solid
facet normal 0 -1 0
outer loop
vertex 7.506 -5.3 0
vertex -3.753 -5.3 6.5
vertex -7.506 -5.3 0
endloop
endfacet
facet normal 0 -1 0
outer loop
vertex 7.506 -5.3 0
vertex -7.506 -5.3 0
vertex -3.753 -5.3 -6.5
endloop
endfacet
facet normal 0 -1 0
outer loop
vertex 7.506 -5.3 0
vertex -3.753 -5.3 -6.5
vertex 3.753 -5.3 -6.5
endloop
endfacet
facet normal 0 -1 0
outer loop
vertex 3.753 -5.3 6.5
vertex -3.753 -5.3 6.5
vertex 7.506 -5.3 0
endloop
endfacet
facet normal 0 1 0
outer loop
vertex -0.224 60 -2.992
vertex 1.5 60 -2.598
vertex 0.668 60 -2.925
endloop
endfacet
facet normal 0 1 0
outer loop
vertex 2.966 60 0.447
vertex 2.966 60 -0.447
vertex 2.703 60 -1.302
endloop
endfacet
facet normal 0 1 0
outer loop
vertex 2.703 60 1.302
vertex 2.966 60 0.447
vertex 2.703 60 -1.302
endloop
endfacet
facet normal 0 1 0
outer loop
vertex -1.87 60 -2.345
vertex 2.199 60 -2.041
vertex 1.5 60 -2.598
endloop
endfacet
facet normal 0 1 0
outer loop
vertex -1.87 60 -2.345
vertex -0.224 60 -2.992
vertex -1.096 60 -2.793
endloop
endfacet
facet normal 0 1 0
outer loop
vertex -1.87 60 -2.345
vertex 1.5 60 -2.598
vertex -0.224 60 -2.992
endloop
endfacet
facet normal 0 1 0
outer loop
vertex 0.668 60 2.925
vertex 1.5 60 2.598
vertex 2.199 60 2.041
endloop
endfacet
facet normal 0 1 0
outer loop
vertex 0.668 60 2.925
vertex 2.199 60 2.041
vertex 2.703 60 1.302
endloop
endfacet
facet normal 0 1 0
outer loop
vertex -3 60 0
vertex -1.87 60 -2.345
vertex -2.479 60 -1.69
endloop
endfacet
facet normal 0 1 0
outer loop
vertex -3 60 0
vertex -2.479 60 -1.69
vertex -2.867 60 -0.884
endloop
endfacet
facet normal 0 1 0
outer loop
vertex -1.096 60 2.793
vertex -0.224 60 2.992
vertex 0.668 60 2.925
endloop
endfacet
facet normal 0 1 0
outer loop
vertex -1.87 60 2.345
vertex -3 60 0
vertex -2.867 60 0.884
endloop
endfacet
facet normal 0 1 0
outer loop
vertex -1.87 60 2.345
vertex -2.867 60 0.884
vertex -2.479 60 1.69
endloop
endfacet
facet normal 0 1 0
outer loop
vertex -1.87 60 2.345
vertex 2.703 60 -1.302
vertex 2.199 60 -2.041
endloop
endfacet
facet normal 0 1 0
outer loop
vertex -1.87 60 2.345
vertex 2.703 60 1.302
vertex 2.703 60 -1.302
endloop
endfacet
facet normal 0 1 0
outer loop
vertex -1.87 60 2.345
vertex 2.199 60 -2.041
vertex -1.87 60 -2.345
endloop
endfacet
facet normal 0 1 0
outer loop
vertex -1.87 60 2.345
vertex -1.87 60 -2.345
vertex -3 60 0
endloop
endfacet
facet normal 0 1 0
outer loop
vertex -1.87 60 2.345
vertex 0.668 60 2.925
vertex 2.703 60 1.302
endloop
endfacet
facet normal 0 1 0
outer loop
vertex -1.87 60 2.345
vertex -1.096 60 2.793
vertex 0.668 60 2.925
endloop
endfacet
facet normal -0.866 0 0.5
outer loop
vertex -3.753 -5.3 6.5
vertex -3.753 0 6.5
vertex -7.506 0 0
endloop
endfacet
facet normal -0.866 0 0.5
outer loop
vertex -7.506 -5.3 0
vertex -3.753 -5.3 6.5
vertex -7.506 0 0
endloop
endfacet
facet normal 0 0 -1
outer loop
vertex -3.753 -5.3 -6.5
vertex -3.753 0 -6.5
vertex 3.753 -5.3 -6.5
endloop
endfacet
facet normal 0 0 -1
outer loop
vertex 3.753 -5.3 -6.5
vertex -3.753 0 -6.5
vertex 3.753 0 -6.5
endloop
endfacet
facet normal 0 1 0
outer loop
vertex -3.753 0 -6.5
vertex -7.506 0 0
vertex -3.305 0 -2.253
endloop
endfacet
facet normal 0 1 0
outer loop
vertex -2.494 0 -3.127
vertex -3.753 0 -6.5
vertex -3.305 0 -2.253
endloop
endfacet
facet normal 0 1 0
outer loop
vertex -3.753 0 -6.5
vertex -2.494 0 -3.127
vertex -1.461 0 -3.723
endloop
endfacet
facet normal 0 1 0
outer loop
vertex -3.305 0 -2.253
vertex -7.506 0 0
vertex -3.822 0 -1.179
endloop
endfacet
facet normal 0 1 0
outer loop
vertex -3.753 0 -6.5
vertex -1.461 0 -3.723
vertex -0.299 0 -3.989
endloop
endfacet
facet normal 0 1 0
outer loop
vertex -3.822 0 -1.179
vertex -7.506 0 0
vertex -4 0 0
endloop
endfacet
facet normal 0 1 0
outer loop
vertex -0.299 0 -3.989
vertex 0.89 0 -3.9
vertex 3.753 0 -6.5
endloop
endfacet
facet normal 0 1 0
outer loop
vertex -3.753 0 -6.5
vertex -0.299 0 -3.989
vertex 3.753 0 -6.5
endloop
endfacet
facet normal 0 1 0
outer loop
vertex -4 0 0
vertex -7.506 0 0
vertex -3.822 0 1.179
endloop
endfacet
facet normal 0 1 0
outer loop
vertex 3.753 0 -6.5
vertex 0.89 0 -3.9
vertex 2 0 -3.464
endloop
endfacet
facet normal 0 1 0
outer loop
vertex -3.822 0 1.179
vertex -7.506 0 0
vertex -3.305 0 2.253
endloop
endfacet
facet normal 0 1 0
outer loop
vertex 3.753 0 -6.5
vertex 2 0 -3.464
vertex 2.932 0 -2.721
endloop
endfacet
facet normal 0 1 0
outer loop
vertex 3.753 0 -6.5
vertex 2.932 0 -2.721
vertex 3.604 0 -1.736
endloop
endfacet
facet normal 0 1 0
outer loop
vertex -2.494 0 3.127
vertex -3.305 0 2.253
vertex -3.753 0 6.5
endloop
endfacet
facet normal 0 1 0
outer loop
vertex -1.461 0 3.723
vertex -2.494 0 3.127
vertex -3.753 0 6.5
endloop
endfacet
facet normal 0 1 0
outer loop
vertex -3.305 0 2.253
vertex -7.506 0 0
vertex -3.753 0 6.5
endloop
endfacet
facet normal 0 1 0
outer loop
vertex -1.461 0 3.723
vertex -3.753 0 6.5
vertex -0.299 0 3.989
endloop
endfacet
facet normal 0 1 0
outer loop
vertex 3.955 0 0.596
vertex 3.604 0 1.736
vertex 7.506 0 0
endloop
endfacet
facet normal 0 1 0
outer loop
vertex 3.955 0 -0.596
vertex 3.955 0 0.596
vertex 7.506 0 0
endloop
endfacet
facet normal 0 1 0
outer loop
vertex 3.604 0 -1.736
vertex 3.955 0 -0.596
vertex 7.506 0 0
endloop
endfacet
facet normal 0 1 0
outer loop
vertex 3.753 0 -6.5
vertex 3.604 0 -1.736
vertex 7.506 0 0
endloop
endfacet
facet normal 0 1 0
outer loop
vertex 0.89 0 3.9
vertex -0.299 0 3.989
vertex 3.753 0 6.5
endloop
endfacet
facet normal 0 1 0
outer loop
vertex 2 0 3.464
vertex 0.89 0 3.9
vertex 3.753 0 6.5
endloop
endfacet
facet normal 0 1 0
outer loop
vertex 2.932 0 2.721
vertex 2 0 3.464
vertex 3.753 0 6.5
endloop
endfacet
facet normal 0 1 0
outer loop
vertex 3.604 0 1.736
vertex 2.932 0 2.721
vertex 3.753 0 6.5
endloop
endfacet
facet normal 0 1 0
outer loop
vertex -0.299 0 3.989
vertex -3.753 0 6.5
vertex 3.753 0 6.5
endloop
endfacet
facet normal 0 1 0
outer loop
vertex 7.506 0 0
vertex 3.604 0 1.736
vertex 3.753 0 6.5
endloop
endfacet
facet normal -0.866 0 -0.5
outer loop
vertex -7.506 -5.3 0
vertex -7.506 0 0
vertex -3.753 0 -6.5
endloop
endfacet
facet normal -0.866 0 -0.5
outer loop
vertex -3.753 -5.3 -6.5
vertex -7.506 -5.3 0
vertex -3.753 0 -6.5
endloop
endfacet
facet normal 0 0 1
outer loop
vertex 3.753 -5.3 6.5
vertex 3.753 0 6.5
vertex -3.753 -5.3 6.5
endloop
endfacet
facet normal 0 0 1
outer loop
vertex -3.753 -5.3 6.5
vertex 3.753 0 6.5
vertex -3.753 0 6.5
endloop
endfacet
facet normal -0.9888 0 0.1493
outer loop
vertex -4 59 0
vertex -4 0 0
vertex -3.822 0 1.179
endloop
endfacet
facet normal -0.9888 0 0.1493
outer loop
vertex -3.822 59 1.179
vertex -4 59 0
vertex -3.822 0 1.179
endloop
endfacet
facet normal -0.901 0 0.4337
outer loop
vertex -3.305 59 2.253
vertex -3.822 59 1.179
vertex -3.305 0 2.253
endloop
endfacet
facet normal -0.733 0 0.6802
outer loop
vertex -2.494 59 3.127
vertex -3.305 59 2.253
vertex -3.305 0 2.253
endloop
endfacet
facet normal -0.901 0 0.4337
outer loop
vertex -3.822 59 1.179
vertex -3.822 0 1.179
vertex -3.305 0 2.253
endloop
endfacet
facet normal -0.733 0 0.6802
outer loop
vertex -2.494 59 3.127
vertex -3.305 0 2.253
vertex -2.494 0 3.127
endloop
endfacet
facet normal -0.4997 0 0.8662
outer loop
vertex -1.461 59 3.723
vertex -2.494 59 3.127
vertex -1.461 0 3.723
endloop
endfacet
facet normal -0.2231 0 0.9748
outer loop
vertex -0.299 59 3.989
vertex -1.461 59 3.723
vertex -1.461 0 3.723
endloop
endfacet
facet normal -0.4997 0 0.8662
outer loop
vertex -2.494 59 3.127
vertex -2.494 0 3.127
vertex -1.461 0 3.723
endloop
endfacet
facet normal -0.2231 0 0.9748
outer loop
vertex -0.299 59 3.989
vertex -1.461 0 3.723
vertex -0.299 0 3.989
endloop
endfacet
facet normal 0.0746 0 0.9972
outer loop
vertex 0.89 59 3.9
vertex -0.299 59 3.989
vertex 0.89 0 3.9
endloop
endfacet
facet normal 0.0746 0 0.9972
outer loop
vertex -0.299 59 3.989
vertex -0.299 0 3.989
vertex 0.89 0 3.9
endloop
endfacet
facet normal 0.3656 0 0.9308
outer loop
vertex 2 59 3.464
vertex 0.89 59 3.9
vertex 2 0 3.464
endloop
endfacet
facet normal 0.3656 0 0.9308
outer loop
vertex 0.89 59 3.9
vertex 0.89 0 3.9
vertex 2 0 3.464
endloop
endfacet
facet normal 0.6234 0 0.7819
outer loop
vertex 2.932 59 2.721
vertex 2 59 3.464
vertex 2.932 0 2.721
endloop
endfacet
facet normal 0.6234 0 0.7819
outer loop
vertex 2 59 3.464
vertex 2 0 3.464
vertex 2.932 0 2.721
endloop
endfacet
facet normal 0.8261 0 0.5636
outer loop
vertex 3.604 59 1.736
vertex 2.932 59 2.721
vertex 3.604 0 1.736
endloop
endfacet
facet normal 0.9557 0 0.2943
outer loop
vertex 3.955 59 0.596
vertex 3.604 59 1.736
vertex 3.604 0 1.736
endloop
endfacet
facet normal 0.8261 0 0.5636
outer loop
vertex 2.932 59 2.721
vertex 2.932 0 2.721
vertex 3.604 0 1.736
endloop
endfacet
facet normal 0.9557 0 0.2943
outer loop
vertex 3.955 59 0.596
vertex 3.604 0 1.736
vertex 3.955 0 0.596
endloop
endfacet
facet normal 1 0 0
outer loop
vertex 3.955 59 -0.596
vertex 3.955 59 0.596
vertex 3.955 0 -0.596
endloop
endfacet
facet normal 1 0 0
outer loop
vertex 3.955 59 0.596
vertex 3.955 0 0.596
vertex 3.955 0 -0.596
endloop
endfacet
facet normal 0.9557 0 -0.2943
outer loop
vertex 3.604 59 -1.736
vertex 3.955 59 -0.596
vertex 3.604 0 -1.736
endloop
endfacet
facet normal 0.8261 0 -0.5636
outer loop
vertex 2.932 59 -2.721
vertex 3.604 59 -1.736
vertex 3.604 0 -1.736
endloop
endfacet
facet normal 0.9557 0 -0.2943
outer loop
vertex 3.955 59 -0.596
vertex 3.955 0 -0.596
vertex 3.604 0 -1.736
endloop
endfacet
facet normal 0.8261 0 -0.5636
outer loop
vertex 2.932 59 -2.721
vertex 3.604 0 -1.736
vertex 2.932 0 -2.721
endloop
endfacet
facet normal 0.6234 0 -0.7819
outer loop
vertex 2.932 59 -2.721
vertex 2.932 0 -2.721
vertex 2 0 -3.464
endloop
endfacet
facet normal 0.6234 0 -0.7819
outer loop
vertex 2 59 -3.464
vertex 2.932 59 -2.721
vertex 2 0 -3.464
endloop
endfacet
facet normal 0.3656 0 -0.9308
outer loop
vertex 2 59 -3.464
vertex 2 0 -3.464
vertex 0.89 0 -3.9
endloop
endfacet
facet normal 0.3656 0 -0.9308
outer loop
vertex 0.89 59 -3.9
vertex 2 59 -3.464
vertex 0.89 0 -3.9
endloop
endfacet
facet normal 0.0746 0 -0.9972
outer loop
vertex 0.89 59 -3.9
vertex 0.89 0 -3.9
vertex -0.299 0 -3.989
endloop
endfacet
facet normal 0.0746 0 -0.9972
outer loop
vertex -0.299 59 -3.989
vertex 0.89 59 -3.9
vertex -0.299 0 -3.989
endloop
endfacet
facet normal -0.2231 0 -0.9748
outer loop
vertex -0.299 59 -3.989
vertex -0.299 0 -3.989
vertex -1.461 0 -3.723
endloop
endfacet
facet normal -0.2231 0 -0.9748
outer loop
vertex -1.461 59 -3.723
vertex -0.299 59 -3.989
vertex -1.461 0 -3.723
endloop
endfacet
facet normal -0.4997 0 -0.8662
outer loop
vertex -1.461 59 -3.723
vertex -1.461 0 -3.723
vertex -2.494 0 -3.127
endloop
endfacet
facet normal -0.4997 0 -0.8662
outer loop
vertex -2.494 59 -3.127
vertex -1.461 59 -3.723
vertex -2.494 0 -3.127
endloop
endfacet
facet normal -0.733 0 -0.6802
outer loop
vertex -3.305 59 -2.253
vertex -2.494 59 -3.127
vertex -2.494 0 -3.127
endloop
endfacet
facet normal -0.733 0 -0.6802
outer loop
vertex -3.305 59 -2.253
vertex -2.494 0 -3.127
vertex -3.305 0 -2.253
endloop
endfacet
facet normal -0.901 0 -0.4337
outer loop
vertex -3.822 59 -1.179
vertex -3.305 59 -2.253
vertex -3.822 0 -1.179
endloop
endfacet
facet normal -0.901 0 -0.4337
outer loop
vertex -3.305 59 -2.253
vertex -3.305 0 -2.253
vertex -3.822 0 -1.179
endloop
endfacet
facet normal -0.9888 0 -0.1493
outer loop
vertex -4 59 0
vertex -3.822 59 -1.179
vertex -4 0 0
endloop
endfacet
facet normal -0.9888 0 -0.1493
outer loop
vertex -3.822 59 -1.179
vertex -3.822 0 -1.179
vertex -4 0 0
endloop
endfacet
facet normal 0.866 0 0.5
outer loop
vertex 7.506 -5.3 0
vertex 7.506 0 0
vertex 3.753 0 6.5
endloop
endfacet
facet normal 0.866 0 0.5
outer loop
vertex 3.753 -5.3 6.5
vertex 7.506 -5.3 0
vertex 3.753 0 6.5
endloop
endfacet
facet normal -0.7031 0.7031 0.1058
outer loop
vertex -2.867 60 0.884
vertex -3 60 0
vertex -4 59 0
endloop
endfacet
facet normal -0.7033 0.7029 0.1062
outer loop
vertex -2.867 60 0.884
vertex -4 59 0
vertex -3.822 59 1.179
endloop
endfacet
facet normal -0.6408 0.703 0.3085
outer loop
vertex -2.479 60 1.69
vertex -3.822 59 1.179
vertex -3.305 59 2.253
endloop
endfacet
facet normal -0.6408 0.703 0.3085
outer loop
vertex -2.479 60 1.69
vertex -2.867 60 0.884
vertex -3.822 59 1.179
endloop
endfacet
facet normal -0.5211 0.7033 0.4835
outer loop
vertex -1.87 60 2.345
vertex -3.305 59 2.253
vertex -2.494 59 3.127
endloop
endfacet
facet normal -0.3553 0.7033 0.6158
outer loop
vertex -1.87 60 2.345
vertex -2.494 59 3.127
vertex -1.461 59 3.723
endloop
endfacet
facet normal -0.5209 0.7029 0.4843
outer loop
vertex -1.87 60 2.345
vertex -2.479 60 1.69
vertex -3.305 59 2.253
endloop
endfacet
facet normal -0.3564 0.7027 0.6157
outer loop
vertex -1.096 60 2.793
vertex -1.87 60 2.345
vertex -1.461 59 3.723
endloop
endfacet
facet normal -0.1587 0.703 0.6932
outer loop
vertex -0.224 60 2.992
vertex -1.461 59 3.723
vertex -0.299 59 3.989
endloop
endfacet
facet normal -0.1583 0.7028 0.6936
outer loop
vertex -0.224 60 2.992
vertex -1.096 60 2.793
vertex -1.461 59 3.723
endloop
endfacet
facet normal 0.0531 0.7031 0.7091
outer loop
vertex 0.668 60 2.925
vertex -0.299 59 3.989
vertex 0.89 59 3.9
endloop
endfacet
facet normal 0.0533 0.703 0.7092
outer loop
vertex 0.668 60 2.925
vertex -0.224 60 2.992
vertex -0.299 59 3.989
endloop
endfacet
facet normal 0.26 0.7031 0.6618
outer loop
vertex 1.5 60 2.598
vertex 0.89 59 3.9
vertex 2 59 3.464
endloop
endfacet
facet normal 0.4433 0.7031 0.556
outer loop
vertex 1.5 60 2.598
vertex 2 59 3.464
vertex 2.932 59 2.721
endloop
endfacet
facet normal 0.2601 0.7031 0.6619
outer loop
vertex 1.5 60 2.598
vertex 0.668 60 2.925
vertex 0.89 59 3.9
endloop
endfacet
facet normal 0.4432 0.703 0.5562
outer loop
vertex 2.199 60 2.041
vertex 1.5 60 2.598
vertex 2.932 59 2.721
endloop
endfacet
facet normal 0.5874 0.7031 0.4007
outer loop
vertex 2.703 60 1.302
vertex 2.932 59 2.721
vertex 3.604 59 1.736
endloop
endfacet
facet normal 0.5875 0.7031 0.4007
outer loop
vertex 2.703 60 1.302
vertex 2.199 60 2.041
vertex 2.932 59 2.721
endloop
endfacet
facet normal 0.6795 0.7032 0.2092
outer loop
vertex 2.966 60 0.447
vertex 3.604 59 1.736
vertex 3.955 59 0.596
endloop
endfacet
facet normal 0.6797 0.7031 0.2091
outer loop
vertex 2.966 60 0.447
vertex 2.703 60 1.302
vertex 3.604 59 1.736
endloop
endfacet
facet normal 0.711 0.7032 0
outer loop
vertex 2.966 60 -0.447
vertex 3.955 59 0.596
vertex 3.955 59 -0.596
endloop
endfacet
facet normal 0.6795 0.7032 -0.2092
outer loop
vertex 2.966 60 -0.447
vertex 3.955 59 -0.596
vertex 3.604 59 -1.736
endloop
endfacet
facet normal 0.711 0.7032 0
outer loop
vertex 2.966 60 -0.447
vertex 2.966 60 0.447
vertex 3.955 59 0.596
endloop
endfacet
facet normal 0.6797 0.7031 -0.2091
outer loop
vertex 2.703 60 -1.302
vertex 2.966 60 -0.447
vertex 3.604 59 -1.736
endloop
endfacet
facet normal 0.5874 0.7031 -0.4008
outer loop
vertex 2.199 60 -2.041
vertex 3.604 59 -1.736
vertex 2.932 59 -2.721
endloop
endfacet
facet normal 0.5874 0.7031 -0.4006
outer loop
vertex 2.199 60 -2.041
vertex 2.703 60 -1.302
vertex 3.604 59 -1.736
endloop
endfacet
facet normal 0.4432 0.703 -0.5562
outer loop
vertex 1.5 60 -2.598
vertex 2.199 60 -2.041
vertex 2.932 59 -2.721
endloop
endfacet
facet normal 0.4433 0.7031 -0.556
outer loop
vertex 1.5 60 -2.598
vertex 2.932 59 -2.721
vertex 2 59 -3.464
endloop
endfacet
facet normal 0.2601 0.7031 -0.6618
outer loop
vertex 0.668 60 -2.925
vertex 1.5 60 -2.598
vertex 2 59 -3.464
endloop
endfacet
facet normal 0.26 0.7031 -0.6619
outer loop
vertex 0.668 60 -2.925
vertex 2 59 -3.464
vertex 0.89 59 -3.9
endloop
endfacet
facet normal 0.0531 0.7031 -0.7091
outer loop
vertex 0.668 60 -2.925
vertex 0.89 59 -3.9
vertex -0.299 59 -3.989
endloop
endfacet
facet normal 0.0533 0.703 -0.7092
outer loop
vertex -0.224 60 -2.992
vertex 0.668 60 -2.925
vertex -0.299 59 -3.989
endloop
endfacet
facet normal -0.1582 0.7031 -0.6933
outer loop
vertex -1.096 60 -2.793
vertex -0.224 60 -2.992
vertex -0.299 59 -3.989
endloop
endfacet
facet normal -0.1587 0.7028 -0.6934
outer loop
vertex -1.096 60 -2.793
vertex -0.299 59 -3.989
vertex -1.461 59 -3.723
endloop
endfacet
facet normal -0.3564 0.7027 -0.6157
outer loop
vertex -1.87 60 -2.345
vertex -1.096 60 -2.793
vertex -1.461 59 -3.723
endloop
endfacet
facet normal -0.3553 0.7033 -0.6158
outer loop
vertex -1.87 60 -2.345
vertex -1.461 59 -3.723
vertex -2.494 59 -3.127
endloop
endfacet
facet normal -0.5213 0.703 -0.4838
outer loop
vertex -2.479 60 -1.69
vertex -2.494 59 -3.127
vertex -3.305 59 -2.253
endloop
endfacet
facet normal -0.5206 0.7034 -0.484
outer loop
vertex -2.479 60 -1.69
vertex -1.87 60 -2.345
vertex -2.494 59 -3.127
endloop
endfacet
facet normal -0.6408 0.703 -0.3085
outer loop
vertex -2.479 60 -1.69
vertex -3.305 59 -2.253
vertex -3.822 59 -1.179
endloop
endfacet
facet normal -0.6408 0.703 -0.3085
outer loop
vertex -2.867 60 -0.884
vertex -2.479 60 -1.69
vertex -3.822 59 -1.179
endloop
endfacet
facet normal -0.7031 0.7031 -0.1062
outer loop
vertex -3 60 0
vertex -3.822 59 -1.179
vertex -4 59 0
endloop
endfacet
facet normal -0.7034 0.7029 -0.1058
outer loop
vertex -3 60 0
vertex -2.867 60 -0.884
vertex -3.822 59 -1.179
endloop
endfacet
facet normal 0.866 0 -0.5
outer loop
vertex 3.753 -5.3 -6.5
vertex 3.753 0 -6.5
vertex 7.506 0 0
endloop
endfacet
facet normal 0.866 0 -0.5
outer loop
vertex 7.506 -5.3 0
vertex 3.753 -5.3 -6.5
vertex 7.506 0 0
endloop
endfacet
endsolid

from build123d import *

# Parameters (mm, degrees)
F1_DEPTH = 5.3
F2_R     = 4
F3_DEPTH = 60
F4_SIZE  = 1


with BuildPart() as f1:
    # F0 (on Front) → F1 (new body)
    with BuildSketch(Plane.XZ):
        Polygon((3.752777, -6.5), (7.505553, 0), (3.752777, 6.5), (-3.752777, 6.5), (-7.505553, 0), (-3.752777, -6.5), align=None)
    extrude(amount=F1_DEPTH)

    # F2 (on face) → F3 (join)
    with BuildSketch(Plane(origin=(0, 0, 0), x_dir=(-1, 0, 0), z_dir=(0, 1, 0))):
        Circle(F2_R)
    extrude(amount=F3_DEPTH)

    # F4
    f4_edges = [f1.edges().sort_by_distance(p)[0] for p in [
        (4, 60, 0),
    ]]
    chamfer(f4_edges, length=F4_SIZE)


solid = f1.part
